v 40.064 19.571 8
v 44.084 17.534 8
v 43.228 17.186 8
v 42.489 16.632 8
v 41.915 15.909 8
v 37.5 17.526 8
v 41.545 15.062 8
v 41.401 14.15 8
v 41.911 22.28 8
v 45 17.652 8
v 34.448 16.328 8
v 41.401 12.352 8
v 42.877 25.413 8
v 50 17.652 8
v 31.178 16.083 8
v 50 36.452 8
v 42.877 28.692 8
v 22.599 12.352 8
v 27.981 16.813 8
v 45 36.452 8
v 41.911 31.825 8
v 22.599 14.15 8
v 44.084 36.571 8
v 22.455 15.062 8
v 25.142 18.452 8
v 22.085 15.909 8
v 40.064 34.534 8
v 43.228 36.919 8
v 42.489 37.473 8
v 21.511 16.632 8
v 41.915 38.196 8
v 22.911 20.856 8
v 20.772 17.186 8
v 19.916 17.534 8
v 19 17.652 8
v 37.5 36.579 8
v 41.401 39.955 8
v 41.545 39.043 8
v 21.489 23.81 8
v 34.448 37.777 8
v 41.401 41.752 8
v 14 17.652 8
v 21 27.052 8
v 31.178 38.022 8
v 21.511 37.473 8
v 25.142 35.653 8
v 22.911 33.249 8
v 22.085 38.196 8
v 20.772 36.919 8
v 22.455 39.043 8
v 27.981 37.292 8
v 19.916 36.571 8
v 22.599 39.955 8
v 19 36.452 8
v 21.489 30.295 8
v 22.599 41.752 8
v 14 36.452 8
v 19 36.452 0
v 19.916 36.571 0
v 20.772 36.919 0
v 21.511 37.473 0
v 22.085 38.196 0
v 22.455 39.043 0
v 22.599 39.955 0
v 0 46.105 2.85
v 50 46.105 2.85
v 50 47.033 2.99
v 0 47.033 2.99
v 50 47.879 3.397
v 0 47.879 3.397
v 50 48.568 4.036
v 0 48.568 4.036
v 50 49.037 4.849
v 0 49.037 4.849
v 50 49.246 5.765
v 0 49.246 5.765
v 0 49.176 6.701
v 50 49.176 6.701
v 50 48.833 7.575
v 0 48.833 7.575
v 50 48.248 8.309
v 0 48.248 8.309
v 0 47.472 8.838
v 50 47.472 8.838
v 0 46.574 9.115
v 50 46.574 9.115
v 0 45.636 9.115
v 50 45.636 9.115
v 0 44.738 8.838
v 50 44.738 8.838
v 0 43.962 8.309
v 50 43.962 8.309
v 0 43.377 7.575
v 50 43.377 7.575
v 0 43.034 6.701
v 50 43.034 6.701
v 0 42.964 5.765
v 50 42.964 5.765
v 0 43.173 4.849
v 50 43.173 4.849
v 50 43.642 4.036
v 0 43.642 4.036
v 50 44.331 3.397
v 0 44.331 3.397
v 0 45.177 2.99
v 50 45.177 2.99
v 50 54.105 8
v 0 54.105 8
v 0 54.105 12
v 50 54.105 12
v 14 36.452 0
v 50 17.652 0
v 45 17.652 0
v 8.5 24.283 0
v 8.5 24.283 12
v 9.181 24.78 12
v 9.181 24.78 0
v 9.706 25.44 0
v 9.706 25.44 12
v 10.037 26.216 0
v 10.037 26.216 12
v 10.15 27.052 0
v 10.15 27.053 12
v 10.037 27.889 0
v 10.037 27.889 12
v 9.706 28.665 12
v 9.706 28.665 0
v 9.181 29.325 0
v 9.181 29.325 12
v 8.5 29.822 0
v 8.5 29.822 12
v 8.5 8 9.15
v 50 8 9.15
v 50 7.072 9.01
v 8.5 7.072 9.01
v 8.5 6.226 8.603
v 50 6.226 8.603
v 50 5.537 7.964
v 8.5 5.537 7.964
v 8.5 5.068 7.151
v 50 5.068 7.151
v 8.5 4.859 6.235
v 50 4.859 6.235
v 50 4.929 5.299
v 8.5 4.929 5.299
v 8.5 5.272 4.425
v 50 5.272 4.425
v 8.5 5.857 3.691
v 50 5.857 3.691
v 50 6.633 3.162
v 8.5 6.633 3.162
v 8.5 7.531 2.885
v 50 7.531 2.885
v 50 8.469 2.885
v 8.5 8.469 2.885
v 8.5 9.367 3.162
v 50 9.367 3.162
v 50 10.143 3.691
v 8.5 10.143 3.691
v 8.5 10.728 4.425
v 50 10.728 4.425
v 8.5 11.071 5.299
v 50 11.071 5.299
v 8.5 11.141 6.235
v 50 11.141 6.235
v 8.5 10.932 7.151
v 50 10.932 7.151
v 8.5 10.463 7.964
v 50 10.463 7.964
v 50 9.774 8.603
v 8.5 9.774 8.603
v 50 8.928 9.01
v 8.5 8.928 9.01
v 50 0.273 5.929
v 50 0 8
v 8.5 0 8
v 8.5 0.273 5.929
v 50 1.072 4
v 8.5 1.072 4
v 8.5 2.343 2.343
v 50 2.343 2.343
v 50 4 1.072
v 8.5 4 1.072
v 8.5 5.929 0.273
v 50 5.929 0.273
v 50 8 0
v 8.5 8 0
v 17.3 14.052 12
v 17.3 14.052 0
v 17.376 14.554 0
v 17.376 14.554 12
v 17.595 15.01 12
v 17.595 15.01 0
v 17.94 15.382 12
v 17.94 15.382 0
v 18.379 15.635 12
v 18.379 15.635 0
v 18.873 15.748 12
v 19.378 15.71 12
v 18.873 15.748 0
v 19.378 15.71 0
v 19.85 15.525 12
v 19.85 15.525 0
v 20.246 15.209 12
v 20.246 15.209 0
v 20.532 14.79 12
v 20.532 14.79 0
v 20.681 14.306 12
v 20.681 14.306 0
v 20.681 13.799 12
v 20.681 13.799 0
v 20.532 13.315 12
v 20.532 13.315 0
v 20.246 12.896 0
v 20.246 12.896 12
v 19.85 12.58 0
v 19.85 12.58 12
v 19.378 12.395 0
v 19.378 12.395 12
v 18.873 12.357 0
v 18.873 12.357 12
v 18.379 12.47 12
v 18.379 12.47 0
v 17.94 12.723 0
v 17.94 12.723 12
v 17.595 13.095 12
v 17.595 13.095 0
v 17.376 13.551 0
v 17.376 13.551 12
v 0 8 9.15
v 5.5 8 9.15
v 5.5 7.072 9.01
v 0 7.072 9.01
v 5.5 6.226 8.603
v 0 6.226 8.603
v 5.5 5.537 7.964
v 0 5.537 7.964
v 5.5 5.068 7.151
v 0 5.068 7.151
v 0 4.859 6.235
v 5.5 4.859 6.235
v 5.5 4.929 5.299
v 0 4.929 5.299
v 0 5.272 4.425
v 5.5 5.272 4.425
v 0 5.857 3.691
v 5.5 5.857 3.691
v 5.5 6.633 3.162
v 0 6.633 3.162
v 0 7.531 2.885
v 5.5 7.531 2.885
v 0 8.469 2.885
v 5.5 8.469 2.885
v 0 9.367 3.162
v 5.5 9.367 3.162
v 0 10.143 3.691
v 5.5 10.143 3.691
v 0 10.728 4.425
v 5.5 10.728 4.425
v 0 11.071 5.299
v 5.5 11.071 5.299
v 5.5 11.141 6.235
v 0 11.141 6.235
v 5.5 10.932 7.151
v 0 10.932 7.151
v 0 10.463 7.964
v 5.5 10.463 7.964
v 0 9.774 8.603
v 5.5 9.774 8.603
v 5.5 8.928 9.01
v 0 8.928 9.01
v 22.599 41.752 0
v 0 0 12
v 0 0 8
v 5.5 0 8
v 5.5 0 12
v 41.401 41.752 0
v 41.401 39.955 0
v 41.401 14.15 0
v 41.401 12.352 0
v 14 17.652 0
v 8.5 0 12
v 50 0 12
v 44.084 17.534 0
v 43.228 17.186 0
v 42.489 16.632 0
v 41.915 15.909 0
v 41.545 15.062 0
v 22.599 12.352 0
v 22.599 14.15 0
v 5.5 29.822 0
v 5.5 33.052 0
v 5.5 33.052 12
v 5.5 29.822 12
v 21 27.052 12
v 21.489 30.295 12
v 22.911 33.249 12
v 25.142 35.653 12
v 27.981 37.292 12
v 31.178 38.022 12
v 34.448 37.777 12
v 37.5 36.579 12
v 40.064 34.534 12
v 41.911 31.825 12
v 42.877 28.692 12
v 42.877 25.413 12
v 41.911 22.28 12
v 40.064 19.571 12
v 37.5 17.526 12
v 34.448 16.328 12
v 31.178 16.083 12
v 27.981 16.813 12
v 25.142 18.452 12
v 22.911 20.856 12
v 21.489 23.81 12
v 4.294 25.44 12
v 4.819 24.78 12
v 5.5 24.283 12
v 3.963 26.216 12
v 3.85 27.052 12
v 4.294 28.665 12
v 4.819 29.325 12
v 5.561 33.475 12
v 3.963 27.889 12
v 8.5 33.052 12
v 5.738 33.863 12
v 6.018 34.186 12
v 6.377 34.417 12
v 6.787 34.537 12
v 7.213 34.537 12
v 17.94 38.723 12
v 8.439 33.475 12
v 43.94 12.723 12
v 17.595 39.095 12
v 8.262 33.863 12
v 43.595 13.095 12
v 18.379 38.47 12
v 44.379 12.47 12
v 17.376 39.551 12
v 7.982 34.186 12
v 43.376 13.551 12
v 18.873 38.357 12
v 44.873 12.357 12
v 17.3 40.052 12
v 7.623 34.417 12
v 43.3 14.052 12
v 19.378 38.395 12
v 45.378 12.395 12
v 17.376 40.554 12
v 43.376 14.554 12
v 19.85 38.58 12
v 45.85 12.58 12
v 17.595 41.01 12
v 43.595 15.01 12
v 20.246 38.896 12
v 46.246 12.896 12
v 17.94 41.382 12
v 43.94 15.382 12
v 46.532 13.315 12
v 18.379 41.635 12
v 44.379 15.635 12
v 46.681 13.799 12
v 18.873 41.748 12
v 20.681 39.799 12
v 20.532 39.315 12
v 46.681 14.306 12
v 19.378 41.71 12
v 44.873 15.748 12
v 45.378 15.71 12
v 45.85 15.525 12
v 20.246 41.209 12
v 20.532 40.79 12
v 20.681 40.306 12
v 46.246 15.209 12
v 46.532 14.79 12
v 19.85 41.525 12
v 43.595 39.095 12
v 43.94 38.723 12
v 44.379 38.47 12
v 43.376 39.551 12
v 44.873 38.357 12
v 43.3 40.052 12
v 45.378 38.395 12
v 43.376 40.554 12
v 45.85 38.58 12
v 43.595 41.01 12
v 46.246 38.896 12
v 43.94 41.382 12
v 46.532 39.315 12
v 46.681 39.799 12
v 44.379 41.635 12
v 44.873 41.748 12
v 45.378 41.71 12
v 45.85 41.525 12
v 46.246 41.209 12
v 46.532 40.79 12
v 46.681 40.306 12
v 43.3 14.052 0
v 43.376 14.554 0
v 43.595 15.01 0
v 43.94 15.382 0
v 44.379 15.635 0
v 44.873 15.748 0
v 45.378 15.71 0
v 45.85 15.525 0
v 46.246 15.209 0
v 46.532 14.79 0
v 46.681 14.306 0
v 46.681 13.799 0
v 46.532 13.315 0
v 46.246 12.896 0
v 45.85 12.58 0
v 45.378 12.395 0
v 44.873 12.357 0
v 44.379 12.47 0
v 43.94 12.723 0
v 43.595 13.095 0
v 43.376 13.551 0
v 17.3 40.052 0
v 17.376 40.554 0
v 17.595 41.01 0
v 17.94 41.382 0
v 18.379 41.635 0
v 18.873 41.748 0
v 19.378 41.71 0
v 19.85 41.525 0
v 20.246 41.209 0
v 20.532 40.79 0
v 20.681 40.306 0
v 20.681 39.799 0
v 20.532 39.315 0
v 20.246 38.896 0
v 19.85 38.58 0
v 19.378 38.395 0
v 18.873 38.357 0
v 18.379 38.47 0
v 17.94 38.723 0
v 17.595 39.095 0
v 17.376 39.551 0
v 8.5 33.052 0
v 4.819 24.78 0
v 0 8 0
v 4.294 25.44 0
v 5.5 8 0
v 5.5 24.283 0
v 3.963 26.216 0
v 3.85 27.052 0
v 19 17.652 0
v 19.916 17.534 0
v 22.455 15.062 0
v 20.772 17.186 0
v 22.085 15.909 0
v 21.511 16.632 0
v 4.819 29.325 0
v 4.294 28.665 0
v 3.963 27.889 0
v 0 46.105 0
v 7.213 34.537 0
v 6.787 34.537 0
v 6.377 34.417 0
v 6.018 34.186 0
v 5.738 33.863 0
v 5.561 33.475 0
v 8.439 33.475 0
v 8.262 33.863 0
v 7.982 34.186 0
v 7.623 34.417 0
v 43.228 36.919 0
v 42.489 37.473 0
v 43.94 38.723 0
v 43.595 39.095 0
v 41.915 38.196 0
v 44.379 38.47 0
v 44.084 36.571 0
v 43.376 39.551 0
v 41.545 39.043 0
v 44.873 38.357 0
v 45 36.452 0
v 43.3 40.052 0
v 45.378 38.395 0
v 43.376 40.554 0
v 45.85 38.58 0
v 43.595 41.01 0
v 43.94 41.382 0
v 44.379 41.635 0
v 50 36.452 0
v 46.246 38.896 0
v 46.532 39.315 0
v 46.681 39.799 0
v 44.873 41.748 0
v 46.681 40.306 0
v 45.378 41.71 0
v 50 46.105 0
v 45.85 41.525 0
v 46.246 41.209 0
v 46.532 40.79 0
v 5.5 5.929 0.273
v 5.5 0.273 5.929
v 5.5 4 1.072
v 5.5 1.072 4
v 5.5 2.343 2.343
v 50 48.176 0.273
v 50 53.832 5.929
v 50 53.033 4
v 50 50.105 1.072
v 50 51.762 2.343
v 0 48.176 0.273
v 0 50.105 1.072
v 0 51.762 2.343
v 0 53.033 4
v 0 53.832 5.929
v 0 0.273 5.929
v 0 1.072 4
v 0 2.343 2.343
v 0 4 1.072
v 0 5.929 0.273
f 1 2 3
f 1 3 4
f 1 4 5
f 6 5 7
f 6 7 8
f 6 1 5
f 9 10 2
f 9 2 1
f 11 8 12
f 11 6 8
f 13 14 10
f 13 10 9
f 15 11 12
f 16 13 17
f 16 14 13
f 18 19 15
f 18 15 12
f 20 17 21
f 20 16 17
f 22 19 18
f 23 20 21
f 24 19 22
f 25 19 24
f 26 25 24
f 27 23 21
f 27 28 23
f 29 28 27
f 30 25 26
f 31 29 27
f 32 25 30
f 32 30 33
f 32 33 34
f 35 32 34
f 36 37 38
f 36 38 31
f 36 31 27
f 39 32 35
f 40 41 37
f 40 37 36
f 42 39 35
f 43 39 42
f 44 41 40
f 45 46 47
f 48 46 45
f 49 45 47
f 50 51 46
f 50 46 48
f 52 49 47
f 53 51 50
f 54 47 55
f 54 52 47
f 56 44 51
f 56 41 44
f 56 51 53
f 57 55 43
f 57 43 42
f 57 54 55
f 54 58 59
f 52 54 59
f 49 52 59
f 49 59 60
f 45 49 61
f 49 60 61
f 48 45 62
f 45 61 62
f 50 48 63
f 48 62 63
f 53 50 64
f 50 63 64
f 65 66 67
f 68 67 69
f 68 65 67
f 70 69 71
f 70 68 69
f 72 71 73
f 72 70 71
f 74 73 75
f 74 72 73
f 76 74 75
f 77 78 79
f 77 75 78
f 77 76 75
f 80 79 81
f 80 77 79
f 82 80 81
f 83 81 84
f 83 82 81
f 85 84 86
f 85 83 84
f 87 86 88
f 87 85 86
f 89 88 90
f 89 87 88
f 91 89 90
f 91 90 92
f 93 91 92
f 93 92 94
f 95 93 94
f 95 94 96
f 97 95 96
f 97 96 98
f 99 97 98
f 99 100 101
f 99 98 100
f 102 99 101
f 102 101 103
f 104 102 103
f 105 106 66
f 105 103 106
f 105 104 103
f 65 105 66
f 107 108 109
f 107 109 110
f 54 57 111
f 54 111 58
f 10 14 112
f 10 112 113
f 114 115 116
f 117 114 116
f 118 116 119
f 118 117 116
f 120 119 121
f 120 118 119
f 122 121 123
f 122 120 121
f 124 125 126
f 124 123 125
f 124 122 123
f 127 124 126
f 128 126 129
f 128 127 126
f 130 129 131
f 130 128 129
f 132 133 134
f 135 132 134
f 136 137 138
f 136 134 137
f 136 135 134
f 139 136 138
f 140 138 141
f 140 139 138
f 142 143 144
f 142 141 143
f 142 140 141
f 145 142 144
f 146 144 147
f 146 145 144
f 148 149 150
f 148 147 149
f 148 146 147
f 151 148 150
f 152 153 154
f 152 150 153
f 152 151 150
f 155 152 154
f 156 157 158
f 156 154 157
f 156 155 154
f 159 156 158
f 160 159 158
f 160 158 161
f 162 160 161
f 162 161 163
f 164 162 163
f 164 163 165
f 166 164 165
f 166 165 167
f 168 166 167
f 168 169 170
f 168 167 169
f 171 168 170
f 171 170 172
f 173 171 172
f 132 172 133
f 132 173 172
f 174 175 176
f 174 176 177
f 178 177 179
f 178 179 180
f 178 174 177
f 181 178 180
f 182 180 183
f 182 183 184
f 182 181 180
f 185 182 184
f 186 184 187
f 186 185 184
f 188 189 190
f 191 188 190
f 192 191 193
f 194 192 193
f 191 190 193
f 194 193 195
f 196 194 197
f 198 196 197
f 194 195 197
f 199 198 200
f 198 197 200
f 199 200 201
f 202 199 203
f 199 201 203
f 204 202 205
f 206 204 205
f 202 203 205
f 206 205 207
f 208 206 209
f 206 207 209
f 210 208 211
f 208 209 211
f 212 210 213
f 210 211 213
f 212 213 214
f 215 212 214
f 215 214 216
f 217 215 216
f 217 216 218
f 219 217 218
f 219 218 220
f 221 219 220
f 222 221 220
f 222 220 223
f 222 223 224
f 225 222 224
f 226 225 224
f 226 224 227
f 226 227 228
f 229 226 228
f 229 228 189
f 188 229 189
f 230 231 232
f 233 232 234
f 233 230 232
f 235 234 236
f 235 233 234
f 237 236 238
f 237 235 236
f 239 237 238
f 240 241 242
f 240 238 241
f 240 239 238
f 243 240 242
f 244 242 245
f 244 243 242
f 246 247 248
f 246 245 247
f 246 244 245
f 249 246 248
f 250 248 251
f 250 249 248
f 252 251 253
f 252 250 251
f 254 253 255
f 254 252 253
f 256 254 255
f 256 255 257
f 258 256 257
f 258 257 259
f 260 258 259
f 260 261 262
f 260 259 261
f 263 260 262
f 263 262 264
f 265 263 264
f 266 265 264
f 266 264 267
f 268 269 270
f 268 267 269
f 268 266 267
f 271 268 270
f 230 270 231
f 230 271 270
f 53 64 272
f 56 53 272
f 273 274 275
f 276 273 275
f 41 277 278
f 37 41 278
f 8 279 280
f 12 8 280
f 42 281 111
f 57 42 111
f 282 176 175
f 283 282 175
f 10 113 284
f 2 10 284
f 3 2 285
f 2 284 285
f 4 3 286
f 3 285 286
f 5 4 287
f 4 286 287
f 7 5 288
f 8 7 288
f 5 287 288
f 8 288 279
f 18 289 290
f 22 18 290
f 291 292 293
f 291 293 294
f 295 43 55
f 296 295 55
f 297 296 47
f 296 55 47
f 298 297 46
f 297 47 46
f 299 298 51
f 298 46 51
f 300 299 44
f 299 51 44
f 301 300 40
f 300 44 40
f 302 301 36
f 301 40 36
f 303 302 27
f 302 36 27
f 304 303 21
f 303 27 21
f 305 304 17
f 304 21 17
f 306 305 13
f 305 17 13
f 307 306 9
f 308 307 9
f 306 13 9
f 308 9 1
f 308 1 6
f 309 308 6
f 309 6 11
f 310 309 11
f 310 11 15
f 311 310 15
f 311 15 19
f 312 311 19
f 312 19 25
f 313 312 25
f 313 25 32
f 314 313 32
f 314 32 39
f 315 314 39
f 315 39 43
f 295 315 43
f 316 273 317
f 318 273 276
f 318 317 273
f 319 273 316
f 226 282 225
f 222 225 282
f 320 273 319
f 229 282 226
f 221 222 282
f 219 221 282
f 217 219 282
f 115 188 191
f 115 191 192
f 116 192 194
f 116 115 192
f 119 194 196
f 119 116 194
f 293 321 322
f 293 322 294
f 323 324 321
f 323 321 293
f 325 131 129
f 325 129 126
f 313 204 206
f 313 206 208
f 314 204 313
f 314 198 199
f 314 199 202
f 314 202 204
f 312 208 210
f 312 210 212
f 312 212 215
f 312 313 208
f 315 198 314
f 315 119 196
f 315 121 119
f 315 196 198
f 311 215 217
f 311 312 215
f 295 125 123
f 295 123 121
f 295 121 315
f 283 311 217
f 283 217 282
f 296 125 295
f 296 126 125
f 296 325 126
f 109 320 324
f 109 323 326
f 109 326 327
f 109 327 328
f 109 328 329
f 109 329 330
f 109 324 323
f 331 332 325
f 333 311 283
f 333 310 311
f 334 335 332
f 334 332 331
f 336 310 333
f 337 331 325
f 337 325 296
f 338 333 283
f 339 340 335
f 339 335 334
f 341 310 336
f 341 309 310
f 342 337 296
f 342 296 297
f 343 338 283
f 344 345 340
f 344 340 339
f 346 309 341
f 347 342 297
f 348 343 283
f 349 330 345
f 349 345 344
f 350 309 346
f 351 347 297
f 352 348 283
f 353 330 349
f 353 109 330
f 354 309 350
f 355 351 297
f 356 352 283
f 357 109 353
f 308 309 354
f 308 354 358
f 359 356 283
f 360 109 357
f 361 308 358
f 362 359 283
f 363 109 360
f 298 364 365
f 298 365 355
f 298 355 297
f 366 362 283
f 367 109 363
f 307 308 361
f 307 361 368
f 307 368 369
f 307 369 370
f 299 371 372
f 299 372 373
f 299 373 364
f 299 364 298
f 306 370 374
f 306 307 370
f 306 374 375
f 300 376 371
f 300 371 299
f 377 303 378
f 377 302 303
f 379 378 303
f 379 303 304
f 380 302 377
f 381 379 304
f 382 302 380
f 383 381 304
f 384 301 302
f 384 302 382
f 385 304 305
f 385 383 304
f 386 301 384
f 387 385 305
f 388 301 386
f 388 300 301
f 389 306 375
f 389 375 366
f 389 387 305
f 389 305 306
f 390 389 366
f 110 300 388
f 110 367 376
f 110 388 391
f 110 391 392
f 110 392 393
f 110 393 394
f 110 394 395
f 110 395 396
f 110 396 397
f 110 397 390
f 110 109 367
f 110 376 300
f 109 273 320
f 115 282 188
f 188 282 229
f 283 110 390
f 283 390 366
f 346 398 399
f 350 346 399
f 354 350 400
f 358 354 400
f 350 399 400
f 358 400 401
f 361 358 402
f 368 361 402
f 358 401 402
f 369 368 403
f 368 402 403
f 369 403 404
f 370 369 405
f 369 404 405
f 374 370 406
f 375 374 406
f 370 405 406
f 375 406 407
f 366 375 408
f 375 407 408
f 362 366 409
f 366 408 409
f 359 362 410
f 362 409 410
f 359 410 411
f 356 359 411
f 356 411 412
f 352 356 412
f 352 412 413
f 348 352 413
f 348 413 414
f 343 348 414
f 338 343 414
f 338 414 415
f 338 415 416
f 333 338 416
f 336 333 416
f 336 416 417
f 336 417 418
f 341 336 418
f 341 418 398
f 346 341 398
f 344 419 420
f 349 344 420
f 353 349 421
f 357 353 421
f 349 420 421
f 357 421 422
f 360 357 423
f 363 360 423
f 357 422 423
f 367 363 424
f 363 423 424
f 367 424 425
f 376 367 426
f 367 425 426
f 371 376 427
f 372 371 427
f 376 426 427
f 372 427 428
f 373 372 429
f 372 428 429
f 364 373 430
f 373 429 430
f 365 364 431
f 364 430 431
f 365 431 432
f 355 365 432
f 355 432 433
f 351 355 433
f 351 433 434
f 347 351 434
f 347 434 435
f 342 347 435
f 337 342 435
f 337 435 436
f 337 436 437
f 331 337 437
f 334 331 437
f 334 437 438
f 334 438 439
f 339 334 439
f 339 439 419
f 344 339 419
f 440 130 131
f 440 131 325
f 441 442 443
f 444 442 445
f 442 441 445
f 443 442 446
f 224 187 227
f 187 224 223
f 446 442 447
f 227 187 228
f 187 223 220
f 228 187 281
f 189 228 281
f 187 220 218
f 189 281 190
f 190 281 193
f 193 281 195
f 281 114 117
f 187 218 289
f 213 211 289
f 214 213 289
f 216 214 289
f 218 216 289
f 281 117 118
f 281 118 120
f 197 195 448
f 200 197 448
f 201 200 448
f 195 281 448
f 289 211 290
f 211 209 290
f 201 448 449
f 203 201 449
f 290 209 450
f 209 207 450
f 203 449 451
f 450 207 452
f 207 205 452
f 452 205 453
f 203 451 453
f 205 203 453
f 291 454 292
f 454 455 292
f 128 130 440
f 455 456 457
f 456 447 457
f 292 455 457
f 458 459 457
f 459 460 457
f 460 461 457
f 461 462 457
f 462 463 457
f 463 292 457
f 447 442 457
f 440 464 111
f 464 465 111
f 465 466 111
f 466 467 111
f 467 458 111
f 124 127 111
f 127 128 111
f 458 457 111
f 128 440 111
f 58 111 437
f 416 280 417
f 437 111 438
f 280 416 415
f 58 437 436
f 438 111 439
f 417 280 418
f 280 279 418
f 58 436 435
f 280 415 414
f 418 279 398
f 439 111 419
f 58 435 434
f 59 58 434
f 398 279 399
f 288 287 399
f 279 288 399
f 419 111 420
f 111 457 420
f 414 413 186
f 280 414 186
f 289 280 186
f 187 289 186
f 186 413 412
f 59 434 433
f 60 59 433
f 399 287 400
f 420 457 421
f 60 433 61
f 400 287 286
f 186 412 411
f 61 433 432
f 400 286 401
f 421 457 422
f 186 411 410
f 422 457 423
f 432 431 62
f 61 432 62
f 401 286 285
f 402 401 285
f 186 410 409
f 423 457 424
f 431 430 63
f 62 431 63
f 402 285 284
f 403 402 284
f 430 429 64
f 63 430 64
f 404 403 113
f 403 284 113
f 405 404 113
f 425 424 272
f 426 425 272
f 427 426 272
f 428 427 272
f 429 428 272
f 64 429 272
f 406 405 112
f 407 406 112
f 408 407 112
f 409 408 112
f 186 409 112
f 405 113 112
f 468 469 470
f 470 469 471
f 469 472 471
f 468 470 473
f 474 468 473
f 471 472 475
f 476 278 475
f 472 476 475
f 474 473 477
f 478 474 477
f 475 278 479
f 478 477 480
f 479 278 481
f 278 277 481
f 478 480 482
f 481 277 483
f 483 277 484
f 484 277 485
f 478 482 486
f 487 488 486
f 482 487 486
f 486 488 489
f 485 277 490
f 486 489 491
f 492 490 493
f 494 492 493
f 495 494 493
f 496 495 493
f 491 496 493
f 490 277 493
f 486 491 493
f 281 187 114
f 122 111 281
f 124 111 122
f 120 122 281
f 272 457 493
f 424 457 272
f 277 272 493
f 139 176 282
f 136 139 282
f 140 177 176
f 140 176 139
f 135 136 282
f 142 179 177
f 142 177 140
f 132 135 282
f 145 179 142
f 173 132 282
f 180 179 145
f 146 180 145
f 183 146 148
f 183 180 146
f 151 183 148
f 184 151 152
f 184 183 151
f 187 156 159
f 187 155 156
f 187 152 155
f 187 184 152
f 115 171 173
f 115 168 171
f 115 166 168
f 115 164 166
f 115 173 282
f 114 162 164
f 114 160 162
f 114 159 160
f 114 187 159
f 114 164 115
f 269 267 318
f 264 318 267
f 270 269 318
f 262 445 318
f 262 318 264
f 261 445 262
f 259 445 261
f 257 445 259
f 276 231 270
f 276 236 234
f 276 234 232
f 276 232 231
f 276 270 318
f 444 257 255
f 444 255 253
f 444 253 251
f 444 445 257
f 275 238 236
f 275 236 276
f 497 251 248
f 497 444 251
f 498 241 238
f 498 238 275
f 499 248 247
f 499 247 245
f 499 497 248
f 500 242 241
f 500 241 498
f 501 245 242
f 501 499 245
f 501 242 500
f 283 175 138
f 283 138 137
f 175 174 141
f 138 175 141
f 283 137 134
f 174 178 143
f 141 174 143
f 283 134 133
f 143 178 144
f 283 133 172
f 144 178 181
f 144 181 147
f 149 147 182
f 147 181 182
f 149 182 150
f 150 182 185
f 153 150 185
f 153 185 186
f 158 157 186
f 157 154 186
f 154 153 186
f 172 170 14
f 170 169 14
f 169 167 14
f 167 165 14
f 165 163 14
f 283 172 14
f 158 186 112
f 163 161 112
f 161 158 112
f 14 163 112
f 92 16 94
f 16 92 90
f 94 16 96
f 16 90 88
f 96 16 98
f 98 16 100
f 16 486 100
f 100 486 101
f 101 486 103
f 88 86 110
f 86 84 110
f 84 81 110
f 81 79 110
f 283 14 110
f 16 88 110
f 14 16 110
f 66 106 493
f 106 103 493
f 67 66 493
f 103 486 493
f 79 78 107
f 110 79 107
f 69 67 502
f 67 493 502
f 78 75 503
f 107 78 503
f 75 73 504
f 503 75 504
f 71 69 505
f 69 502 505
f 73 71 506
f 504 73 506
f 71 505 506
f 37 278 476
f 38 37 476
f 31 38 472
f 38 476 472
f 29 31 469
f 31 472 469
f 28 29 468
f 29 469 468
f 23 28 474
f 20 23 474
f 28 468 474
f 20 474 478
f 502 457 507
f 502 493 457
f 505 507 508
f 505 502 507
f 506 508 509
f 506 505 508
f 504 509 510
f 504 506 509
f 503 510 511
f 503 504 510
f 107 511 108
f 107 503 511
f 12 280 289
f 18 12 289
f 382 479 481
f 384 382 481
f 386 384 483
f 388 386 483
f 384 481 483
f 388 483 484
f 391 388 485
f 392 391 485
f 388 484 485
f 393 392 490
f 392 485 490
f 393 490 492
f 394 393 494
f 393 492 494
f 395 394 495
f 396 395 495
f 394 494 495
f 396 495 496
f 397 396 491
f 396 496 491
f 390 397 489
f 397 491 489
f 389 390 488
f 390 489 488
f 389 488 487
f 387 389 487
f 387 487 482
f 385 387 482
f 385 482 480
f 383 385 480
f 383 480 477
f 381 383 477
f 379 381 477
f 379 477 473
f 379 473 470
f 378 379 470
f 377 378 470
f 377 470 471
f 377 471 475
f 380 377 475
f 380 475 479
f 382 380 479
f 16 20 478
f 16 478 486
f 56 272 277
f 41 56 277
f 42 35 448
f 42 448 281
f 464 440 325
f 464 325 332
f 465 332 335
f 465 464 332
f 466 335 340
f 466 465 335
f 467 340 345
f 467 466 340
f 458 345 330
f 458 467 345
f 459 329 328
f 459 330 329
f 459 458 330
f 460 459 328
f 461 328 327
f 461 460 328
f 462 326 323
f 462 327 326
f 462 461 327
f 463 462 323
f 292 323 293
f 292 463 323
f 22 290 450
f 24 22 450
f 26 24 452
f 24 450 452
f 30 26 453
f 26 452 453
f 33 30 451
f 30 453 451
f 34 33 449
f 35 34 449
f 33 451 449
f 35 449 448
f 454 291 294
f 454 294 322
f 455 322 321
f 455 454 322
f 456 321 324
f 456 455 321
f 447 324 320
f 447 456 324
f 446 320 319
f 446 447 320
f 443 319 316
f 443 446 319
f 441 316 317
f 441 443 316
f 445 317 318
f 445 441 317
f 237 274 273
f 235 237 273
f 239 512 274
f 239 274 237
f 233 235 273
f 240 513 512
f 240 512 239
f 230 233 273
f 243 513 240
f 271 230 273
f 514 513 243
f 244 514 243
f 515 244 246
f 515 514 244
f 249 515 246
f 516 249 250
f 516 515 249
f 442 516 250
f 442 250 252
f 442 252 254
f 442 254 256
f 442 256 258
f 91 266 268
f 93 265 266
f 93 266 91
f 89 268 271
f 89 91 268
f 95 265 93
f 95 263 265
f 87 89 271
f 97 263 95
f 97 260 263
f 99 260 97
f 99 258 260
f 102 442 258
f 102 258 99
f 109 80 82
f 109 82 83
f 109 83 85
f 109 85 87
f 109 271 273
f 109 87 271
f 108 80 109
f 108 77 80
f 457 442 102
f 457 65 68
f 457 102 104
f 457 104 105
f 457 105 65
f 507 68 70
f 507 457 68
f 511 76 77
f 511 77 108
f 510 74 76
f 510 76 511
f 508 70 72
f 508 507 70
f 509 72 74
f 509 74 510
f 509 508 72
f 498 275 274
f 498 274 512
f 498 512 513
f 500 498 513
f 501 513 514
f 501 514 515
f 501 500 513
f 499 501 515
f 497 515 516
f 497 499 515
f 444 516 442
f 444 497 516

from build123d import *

# Parameters (mm, degrees)
SKETCH1_W           = 50
SKETCH1_H           = 54.105
BOSS_EXTRUDE1_DEPTH = 12
SKETCH2_R           = 3.15
CUT_EXTRUDE1_DEPTH  = 75.641483272
FILLET1_R           = 8
SKETCH3_R           = 11
SKETCH3_R_2         = 1.7
CUT_EXTRUDE2_DEPTH  = 75.641483272
CUT_EXTRUDE4_DEPTH  = 8


with BuildPart() as part:
    # Sketch1 → Boss-Extrude1 (new body)
    with BuildSketch(Plane.XY):
        with Locations((25, 27.0525)):
            Rectangle(SKETCH1_W, SKETCH1_H)
    extrude(amount=BOSS_EXTRUDE1_DEPTH)

    # Sketch2 → Cut-Extrude1 (cut, through all)
    with BuildSketch(Plane(origin=(0, 0, 0), x_dir=(0, 0, -1), z_dir=(1, 0, 0))):
        with Locations((-6, 46.105)):
            Circle(SKETCH2_R)
        with Locations(Location((-6, 8, 0), (0, 0, 180))):
            Circle(SKETCH2_R)
    extrude(amount=CUT_EXTRUDE1_DEPTH, mode=Mode.SUBTRACT)

    # Fillet1
    fillet1_edges = [part.edges().sort_by_distance(p)[0] for p in [
        (25, 54.105, 0),
        (25, 0, 0),
    ]]
    fillet(fillet1_edges, radius=FILLET1_R)

    # Sketch3 → Cut-Extrude2 (cut, through all)
    with BuildSketch(Plane(origin=(0, 0, 0), x_dir=(-1, 0, 0), z_dir=(0, 0, -1))):
        with Locations((-32, 27.0525)):
            Circle(SKETCH3_R)
        with Locations((-19, 40.0525)):
            Circle(SKETCH3_R_2)
        with Locations((-19, 14.0525)):
            Circle(SKETCH3_R_2)
        with Locations((-45, 14.0525)):
            Circle(SKETCH3_R_2)
        with Locations((-45, 40.0525)):
            Circle(SKETCH3_R_2)
        with BuildLine():
            Line((-8.5, 0), (-8.5, 24.282572203))
            ThreePointArc((-8.5, 24.282572203), (-10.15, 27.0525), (-8.5, 29.822427797))
            Line((-8.5, 29.822427797), (-8.5, 33.0525))
            ThreePointArc((-8.5, 33.0525), (-7, 34.5525), (-5.5, 33.0525))
            Line((-5.5, 33.0525), (-5.5, 29.822427797))
            ThreePointArc((-5.5, 29.822427797), (-3.85, 27.0525), (-5.5, 24.282572203))
            Line((-5.5, 24.282572203), (-5.5, 0))
            Line((-5.5, 0), (-8.5, 0))
        make_face()
    extrude(amount=-CUT_EXTRUDE2_DEPTH, mode=Mode.SUBTRACT)

    # Sketch5 → Cut-Extrude4 (cut)
    with BuildSketch(Plane(origin=(0, 0, 0), x_dir=(-1, 0, 0), z_dir=(0, 0, -1))):
        with BuildLine():
            Line((-19, 17.6525), (-14, 17.6525))
            Line((-14, 17.6525), (-14, 36.4525))
            Line((-14, 36.4525), (-19, 36.4525))
            ThreePointArc((-19, 36.4525), (-21.510876341, 37.472674425), (-22.598679445, 39.955))
            Line((-22.598679445, 39.955), (-22.598679445, 41.7525))
            Line((-22.598679445, 41.7525), (-41.401320555, 41.7525))
            Line((-41.401320555, 41.7525), (-41.401320555, 39.955))
            ThreePointArc((-41.401320555, 39.955), (-42.489123659, 37.472674425), (-45, 36.4525))
            Line((-45, 36.4525), (-50, 36.4525))
            Line((-50, 36.4525), (-50, 17.6525))
            Line((-50, 17.6525), (-45, 17.6525))
            ThreePointArc((-45, 17.6525), (-42.489123659, 16.632325575), (-41.401320555, 14.15))
            Line((-41.401320555, 14.15), (-41.401320555, 12.3525))
            Line((-41.401320555, 12.3525), (-22.598679445, 12.3525))
            Line((-22.598679445, 12.3525), (-22.598679445, 14.15))
            ThreePointArc((-22.598679445, 14.15), (-21.510876341, 16.632325575), (-19, 17.6525))
        make_face()
    extrude(amount=-CUT_EXTRUDE4_DEPTH, mode=Mode.SUBTRACT)


solid = part.part
